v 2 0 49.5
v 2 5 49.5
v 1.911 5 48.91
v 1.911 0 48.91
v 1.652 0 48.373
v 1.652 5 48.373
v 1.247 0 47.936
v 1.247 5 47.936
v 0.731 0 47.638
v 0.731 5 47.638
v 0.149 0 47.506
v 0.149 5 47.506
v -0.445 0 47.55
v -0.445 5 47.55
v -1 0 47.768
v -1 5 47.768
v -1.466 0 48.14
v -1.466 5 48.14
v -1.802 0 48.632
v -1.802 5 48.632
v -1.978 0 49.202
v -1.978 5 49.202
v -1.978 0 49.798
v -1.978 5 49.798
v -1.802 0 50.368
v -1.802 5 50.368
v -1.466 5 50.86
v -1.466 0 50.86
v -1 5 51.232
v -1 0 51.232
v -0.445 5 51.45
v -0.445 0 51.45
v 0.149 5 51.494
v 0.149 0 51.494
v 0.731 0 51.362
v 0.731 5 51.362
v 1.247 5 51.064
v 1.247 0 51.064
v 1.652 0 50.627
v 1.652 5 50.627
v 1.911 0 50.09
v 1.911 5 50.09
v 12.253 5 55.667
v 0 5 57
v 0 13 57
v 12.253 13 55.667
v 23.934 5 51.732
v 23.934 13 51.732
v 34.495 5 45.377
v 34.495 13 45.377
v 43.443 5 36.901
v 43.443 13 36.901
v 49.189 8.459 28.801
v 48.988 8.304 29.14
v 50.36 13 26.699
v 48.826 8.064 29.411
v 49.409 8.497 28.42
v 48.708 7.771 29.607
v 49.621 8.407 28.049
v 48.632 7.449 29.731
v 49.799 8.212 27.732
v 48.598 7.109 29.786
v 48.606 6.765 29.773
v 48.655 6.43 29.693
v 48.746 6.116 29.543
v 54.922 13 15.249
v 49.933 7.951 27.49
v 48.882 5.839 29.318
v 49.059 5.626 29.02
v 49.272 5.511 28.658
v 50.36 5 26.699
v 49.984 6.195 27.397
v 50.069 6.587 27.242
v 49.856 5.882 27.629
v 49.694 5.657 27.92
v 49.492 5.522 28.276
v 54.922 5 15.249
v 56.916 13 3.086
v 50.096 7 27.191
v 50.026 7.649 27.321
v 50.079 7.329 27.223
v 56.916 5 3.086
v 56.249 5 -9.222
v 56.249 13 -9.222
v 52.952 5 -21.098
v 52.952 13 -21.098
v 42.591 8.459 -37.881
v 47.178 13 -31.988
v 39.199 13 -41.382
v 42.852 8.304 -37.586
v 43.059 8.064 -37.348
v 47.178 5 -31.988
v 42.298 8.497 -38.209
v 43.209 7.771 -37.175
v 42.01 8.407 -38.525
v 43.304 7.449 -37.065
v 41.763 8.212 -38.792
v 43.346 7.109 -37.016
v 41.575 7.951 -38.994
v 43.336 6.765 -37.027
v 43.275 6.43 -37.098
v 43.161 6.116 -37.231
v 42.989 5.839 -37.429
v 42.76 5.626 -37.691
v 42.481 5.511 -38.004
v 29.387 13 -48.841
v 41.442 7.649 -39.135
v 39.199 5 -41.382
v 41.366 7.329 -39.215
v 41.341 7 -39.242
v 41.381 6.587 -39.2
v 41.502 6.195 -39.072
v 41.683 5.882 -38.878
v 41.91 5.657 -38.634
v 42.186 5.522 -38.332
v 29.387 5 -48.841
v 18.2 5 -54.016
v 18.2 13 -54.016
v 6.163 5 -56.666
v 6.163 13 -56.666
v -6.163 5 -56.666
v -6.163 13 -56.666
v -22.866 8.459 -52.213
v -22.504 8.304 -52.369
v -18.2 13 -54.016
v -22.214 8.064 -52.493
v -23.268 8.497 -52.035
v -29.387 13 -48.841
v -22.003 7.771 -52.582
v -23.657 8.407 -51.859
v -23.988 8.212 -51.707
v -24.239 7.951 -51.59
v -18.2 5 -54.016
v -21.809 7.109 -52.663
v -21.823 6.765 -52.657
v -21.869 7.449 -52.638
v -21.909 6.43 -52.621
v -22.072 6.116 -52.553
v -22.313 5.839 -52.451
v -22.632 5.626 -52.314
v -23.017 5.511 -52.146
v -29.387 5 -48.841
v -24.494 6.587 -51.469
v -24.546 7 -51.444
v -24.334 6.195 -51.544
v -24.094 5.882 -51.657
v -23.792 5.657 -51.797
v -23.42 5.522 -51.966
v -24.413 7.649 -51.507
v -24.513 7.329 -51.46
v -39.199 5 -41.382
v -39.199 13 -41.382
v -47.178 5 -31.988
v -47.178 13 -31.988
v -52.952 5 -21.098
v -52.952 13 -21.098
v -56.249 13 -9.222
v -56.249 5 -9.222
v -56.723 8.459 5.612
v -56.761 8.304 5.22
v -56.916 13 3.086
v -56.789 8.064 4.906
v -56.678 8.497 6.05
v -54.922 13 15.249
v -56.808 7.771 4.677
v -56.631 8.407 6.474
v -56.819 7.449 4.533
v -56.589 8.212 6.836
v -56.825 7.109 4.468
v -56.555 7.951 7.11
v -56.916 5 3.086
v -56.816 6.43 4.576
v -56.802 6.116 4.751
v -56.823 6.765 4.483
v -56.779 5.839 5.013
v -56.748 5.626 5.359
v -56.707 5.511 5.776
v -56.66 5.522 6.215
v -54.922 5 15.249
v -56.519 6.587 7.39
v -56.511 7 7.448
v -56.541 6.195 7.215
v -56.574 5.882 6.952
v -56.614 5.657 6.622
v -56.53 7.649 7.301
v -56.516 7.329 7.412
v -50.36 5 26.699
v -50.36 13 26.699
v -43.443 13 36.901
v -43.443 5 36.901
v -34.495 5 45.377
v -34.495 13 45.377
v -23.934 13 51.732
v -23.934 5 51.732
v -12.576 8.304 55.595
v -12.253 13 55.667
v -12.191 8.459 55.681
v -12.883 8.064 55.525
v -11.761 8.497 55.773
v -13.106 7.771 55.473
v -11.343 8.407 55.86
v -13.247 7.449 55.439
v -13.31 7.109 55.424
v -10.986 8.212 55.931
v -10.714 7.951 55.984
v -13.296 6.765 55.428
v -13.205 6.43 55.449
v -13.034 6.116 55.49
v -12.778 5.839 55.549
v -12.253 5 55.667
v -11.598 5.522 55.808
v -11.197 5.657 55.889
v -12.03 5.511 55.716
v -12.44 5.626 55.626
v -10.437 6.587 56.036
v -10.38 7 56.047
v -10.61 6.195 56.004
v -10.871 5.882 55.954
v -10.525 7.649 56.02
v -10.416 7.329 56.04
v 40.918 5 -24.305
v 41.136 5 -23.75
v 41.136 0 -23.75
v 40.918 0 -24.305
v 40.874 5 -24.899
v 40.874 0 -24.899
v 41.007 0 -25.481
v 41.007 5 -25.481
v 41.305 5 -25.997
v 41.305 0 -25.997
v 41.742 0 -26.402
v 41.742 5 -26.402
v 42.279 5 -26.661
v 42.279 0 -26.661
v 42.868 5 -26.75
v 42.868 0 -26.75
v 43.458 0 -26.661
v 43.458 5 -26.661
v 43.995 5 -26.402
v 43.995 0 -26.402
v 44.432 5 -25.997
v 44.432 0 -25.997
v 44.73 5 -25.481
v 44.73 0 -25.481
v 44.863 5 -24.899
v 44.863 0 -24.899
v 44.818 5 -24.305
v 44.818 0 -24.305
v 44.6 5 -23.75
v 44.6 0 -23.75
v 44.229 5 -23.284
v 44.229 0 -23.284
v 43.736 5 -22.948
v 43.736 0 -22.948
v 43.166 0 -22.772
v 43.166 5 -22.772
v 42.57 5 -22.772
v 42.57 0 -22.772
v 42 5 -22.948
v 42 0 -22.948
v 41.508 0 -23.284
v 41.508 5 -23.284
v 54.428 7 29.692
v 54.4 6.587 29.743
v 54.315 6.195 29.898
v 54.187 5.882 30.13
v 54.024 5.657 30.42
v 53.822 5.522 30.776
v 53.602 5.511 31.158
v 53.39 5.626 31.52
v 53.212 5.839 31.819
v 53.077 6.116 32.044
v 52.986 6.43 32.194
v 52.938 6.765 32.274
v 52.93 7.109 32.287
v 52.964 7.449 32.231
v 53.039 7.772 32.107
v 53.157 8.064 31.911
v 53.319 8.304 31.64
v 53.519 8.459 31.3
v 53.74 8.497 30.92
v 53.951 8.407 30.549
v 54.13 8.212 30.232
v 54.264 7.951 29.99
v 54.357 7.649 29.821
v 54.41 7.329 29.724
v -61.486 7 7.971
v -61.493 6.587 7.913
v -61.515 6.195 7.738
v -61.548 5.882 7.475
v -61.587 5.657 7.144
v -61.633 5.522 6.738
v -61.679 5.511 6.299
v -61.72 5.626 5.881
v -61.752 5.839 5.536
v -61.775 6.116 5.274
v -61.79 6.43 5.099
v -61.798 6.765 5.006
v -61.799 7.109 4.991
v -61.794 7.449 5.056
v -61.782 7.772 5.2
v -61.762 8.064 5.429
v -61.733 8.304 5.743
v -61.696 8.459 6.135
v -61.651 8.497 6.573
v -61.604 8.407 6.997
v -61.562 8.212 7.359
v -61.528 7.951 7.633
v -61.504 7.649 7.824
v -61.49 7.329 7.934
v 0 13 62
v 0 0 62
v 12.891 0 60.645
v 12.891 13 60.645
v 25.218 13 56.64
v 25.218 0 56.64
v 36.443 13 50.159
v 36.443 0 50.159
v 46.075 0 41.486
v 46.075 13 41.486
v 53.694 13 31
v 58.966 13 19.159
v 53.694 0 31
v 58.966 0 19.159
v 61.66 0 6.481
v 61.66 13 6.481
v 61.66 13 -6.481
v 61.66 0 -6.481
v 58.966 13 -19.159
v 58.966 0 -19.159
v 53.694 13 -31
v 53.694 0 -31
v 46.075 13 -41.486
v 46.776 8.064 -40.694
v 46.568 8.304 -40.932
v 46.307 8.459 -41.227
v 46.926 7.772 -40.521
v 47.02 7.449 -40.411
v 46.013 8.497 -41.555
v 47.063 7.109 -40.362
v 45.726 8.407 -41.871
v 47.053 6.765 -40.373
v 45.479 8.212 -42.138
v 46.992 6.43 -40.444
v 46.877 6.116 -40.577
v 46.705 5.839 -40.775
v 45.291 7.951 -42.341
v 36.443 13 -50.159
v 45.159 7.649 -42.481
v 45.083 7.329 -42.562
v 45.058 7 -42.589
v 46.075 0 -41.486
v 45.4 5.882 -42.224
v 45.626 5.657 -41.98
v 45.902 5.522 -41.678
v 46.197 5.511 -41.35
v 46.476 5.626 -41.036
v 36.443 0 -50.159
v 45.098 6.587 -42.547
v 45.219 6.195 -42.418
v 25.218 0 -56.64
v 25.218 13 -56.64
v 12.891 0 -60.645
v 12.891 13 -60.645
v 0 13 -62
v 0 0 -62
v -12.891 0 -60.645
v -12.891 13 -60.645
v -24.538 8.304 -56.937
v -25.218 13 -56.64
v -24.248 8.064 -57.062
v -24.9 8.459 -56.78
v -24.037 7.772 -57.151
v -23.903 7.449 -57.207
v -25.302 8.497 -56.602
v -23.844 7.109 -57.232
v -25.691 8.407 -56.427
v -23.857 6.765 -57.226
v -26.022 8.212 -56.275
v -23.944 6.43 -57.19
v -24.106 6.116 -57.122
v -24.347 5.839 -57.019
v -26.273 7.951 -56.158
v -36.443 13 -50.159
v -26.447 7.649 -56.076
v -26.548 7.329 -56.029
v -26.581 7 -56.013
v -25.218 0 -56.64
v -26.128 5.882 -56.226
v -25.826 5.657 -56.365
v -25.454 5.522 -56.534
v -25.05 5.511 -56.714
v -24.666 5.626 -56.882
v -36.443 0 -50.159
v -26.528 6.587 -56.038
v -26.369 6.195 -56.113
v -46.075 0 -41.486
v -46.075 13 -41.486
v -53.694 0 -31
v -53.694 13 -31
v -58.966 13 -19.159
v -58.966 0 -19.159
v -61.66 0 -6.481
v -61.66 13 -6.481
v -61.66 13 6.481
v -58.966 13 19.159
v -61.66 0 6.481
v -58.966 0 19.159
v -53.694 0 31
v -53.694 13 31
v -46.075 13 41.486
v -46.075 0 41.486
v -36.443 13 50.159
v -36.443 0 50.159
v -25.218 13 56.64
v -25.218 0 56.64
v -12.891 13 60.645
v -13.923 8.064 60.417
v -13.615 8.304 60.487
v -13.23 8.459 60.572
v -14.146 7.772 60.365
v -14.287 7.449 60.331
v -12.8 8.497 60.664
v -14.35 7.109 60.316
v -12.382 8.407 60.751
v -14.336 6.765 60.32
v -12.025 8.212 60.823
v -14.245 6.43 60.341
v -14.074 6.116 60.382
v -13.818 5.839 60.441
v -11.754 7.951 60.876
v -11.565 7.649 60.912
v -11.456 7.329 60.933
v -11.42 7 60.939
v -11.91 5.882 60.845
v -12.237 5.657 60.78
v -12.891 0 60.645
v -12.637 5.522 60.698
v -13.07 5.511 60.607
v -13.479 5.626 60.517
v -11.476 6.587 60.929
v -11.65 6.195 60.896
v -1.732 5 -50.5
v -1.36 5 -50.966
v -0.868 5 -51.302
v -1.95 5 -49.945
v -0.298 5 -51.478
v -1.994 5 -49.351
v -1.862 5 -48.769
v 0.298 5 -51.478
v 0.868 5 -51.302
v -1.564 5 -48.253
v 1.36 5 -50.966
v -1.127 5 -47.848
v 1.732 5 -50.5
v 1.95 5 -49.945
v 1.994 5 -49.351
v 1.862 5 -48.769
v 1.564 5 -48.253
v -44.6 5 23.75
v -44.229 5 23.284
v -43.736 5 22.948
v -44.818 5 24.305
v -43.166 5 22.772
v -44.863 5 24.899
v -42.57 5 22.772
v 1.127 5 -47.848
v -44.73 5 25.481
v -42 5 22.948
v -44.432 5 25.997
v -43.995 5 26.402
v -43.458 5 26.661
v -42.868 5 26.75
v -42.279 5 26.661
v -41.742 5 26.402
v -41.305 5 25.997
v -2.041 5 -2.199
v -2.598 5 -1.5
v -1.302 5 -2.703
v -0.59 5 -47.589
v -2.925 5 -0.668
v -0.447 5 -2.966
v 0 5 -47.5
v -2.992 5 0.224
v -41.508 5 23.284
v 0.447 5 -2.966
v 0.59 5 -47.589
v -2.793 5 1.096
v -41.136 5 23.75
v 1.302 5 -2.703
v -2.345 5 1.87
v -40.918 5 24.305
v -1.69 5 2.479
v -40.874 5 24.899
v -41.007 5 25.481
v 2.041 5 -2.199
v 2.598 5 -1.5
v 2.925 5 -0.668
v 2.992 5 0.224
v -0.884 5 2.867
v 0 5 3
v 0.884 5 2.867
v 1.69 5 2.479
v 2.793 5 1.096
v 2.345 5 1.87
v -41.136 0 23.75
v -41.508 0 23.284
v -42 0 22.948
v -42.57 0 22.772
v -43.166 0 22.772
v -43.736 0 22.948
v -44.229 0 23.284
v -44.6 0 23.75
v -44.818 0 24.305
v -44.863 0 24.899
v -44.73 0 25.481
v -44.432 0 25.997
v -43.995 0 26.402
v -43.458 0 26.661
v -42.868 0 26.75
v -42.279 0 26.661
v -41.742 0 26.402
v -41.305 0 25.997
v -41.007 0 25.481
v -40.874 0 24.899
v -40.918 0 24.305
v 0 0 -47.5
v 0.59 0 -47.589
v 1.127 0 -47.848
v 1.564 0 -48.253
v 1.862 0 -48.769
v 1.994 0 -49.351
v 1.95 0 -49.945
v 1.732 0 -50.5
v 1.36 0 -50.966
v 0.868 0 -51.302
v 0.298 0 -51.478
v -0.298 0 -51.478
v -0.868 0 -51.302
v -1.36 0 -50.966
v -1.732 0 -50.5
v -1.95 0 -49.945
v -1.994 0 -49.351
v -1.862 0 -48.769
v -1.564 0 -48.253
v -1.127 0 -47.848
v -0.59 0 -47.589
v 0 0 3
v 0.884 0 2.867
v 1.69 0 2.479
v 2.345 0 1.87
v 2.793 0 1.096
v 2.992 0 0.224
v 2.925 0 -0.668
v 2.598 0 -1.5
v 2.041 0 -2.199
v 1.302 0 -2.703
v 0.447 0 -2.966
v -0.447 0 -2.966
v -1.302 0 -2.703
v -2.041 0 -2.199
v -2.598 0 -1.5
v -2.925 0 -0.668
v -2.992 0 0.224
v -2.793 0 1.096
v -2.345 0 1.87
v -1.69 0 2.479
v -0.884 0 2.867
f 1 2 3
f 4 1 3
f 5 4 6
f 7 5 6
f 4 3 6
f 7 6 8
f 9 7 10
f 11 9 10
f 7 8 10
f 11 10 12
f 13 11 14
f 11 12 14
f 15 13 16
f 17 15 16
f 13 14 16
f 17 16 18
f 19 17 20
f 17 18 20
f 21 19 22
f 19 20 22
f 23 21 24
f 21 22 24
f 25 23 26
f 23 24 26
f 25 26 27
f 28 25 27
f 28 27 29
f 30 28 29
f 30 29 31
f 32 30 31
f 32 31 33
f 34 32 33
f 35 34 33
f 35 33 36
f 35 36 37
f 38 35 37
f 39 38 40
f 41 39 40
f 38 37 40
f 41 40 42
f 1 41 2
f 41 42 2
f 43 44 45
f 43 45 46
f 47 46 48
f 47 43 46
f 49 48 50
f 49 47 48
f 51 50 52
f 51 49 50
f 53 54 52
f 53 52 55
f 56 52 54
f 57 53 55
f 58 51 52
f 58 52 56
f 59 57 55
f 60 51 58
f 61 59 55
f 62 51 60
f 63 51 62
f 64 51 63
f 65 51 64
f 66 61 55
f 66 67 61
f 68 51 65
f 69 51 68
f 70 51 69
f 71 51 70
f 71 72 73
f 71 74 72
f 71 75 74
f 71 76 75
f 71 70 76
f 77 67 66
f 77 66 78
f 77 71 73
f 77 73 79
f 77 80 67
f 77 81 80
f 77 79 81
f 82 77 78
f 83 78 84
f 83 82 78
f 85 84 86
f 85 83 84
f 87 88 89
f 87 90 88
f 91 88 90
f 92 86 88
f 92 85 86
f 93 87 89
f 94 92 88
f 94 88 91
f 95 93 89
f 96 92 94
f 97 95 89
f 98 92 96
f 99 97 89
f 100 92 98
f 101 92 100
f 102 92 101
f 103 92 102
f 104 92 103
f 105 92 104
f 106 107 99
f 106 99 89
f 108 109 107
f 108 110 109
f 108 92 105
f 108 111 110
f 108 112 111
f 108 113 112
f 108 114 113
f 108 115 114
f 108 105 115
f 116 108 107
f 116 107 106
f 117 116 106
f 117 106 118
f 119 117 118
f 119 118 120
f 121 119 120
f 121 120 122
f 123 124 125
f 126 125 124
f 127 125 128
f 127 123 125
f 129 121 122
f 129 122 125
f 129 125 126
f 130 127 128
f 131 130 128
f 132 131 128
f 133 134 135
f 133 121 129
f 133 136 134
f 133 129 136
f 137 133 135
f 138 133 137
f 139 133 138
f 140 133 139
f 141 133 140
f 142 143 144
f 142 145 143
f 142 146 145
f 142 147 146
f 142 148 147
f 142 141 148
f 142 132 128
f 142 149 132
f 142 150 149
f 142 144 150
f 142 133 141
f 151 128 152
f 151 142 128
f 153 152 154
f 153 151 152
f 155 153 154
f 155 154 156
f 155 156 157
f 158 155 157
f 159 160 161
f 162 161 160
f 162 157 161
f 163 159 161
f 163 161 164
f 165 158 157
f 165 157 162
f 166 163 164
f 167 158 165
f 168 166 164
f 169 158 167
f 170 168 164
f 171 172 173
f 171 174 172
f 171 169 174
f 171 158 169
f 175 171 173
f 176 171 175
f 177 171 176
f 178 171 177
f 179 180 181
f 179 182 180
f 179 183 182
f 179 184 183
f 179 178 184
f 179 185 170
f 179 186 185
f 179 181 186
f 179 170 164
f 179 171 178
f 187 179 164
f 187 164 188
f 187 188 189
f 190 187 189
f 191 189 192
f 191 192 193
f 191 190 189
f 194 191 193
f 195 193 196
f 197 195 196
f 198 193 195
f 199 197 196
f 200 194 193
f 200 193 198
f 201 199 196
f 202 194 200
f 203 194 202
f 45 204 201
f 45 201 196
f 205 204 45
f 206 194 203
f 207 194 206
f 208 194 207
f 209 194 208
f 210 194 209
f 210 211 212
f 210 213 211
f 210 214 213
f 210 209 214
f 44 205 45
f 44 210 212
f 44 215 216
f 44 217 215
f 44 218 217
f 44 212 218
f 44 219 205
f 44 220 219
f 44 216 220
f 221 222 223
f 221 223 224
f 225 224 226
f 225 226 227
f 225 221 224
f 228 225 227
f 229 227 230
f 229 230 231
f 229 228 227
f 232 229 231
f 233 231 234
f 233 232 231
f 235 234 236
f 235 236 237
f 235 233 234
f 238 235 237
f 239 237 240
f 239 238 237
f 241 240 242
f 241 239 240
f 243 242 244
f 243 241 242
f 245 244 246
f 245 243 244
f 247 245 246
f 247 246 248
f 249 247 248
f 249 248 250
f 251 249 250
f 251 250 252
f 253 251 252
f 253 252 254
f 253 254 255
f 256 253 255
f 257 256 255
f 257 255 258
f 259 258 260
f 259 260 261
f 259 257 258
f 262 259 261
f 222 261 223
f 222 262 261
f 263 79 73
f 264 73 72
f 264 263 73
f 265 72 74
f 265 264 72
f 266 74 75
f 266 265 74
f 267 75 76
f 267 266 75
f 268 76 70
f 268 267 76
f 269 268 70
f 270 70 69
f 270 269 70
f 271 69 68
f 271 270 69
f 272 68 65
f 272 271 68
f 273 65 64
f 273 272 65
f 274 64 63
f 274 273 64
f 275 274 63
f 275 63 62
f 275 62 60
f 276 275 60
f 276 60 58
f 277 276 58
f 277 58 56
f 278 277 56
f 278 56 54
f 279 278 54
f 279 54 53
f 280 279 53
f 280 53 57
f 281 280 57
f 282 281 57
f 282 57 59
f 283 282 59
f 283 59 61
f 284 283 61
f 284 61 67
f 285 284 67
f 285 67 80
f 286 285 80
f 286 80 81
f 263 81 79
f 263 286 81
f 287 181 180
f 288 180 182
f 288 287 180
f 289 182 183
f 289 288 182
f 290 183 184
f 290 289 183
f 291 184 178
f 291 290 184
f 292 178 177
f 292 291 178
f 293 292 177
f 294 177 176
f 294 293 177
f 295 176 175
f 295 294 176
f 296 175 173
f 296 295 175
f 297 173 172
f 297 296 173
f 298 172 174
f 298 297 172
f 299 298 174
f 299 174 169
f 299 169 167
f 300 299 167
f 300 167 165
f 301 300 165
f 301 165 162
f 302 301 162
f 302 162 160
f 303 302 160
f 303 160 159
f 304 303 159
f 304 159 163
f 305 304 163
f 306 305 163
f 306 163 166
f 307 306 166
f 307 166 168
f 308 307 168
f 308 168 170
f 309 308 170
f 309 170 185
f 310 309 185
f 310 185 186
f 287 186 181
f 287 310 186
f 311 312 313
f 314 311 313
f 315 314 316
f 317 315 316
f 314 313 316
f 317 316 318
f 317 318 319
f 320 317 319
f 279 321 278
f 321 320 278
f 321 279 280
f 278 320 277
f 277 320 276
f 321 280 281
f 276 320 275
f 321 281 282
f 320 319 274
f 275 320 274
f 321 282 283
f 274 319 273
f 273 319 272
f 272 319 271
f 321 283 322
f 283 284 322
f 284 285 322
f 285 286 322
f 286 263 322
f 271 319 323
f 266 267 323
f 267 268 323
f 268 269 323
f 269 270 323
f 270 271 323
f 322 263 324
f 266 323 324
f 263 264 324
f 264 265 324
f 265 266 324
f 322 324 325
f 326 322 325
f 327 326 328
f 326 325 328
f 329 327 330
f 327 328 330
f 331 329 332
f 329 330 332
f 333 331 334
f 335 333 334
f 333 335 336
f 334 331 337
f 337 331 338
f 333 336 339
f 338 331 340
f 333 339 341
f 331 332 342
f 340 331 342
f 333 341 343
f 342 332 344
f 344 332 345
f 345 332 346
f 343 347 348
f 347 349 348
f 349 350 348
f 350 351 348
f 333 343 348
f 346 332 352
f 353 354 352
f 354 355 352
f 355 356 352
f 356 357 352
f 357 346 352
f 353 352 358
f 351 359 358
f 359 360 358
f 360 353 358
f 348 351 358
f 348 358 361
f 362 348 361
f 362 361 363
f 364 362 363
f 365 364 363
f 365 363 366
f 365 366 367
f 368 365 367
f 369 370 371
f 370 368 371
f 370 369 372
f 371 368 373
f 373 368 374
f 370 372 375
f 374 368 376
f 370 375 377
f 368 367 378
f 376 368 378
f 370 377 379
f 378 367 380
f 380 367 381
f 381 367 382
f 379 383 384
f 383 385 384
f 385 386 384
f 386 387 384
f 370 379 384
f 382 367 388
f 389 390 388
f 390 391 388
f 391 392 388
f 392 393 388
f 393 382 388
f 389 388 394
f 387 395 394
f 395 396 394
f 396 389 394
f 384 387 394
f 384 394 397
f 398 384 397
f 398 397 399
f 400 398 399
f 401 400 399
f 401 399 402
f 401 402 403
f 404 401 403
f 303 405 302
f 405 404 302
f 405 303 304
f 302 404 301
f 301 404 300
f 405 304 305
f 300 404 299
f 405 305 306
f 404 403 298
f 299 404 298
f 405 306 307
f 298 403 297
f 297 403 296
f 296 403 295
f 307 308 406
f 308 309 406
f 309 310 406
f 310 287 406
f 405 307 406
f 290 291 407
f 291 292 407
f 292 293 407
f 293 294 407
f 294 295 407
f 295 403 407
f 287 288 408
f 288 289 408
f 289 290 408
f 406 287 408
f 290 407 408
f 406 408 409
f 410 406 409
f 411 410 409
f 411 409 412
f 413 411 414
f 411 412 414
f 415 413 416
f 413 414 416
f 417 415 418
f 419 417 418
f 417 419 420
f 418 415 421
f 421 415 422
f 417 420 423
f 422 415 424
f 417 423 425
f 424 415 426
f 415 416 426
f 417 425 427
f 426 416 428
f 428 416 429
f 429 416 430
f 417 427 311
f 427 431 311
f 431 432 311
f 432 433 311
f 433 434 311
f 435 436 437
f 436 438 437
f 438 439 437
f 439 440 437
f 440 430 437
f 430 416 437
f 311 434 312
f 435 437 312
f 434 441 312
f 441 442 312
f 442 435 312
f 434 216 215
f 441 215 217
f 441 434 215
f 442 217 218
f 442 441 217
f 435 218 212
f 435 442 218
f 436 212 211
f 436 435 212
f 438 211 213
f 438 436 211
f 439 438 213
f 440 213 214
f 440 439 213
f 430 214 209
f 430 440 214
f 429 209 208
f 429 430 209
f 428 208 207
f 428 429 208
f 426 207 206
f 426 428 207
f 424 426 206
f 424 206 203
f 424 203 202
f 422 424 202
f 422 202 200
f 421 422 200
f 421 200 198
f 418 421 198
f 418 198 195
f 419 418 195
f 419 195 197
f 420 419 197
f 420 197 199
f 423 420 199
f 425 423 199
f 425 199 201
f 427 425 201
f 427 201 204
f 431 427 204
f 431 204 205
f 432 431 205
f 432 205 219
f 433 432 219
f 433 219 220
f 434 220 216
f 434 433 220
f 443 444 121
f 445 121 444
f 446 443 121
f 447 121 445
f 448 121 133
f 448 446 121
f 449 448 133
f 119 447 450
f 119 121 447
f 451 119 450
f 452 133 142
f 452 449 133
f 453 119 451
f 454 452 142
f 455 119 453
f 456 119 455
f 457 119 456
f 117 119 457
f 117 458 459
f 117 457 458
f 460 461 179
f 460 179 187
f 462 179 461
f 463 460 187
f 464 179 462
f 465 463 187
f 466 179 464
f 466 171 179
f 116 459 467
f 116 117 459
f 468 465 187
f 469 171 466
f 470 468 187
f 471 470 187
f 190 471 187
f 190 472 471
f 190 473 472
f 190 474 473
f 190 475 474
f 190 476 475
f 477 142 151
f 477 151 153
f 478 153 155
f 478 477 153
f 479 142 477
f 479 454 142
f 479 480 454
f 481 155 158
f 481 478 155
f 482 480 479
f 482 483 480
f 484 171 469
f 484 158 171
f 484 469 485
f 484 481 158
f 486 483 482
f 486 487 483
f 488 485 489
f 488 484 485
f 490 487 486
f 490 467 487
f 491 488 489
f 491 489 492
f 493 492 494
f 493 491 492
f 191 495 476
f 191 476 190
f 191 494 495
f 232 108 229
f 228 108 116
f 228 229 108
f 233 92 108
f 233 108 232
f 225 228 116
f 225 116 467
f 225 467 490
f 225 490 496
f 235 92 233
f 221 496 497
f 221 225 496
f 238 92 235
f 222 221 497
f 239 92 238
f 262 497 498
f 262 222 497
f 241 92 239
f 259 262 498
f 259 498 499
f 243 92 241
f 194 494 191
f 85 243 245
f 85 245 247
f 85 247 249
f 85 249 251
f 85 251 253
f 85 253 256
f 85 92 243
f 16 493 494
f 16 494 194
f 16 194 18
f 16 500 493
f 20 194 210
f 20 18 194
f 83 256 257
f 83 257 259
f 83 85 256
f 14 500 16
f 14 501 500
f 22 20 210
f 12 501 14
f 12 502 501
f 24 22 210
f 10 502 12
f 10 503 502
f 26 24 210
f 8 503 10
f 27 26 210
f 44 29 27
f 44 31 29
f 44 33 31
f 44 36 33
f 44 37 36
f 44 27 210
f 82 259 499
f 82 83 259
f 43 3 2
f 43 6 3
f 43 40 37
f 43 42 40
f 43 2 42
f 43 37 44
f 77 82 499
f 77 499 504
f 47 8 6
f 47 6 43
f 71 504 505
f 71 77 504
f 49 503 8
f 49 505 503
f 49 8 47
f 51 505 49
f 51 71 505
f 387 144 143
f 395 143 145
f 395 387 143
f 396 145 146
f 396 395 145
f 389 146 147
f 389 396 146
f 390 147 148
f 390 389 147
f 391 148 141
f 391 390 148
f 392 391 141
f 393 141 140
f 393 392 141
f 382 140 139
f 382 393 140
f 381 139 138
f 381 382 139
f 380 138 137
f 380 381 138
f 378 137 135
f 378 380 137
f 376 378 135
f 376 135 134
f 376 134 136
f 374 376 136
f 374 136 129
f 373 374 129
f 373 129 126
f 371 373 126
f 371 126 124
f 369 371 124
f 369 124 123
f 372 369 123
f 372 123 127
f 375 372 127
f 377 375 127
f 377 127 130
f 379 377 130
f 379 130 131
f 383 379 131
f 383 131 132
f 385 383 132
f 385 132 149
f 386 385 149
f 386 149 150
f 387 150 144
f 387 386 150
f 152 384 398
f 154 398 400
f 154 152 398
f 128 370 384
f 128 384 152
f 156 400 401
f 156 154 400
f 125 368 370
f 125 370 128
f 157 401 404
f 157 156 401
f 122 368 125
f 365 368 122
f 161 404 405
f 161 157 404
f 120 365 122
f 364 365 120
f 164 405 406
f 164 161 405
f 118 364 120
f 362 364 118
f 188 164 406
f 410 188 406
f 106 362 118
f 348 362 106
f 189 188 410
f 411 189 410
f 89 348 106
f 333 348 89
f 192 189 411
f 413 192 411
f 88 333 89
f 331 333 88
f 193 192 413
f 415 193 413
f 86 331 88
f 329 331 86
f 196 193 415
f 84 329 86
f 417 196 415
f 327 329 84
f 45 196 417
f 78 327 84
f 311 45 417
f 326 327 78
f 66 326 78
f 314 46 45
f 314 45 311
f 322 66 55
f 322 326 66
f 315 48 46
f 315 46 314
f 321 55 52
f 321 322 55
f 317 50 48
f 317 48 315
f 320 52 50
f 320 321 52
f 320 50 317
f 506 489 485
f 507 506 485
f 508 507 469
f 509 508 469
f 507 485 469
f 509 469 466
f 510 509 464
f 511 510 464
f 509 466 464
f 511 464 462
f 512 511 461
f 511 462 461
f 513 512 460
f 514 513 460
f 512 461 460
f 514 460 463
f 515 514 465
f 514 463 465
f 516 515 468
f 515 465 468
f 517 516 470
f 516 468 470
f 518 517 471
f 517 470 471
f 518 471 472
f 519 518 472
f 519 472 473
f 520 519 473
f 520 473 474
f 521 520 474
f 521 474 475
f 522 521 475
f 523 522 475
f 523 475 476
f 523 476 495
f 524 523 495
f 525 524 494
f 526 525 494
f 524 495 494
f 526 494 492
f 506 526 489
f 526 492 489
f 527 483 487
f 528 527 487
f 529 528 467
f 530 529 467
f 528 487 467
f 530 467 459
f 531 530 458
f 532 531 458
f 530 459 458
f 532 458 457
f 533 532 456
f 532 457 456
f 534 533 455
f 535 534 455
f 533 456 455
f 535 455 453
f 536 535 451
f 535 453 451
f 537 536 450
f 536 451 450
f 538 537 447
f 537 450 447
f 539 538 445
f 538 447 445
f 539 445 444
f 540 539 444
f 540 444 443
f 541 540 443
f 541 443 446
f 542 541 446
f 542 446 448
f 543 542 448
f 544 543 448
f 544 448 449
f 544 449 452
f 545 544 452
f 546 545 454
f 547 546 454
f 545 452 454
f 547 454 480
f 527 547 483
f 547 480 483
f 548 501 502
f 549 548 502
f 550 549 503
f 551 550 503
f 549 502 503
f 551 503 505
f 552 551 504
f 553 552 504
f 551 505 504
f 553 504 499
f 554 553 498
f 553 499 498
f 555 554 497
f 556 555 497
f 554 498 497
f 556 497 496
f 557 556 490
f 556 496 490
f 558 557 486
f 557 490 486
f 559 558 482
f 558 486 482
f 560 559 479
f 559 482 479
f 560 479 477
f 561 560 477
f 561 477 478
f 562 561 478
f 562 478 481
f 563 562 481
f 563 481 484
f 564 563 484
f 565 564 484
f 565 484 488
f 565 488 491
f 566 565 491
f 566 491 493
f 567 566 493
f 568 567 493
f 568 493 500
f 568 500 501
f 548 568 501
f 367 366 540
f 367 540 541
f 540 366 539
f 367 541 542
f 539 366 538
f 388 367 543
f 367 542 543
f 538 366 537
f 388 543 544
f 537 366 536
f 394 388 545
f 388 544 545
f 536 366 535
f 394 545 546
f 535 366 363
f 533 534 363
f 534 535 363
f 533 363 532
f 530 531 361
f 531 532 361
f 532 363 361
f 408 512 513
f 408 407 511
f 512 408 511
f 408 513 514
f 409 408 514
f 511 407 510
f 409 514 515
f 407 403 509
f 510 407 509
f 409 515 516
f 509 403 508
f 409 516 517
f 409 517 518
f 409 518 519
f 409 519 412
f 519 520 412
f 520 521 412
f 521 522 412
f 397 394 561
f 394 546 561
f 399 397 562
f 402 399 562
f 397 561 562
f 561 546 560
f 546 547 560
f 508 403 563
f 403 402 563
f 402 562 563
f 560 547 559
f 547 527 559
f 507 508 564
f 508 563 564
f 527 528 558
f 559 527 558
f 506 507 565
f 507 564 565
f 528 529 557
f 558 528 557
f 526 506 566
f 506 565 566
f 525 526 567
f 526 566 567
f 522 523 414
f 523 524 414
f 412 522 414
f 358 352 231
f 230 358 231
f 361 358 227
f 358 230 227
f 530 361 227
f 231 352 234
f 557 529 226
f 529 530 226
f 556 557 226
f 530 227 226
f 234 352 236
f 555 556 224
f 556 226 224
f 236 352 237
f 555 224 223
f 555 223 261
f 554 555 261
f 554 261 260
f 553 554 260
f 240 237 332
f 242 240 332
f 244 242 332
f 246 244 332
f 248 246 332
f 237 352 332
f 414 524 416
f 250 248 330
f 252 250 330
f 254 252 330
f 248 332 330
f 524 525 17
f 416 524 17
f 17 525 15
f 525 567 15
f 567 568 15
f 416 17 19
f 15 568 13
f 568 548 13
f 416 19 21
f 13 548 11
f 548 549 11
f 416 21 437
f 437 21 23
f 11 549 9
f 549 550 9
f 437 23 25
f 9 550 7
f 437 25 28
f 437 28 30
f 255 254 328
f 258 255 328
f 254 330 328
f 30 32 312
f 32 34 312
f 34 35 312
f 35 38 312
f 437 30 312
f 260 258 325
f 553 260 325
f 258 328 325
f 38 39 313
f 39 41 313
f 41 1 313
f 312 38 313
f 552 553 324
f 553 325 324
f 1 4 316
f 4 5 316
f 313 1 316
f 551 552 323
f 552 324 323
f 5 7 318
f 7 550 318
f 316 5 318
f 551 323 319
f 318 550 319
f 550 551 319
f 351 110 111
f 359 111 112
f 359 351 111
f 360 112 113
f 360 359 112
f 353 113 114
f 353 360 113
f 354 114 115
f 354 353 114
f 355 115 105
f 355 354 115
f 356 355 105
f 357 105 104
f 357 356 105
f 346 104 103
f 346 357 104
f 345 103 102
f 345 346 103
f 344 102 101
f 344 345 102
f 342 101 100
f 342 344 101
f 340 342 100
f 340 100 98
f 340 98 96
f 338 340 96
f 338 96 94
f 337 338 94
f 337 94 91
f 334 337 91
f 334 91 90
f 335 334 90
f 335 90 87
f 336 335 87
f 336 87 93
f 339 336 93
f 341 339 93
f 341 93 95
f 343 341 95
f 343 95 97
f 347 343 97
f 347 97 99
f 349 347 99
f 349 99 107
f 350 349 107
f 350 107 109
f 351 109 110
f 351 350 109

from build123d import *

# Parameters (mm, degrees)
SKETCH1_R               = 62
BOSS_EXTRUDE1_DEPTH     = 5
SKETCH2_R               = 2
CUT_EXTRUDE1_DEPTH      = 5
CIRPATTERN1_COUNT       = 2
CIRPATTERN1_ANGLE       = 120
MIRROR1_COPY_1_SKETCH_R = 2
MIRROR1_COPY_1_DEPTH    = 5
SKETCH5_R               = 62
SKETCH5_R_2             = 57
BOSS_EXTRUDE2_DEPTH     = 8
CUT_EXTRUDE2_START      = -90
SKETCH6_R               = 1.5
CUT_EXTRUDE2_DEPTH      = 91
CIRPATTERN2_COUNT       = 5
SKETCH7_R               = 3
CUT_EXTRUDE3_DEPTH      = 10


with BuildPart() as part:
    # Sketch1 → Boss-Extrude1 (new body)
    with BuildSketch(Plane(origin=(0, 0, 0), x_dir=(1, 0, 0), z_dir=(0, 1, 0))):
        with Locations(Location((0, 0, 0), (0, 0, 270))):
            Circle(SKETCH1_R)
    extrude(amount=BOSS_EXTRUDE1_DEPTH)

    # Sketch2 → Cut-Extrude1 (cut)
    with BuildSketch(Plane(origin=(0, 5, 0), x_dir=(1, 0, 0), z_dir=(0, 1, 0))):
        with Locations(Location((0, 49.5, 0), (0, 0, 270))):
            Circle(SKETCH2_R)
    cut_extrude1 = extrude(amount=-CUT_EXTRUDE1_DEPTH, mode=Mode.SUBTRACT)

    # CirPattern1: Cut-Extrude1 ×2 about axis
    cirpattern1_axis = Axis((0, 5, 0), (0, 1, 0))
    for i in range(1, CIRPATTERN1_COUNT):
        add(cut_extrude1.rotate(cirpattern1_axis, i * CIRPATTERN1_ANGLE / (CIRPATTERN1_COUNT - 1)), mode=Mode.SUBTRACT)

    # Mirror1: Cut-Extrude1 across plane
    add(cut_extrude1.mirror(Plane(origin=(0, 0, 0), x_dir=(-0.49999999999999806, 0, 0.8660254037844398), z_dir=(-0.8660254037844398, 0, -0.49999999999999806))), mode=Mode.SUBTRACT)

    # Mirror1 copy 1 sketch → Mirror1 copy 1 (cut)
    with BuildSketch(Plane(origin=(0, 5, 0), x_dir=(1, 0, 0), z_dir=(0, 1, 0))):
        with Locations((0, -49.5)):
            Circle(MIRROR1_COPY_1_SKETCH_R)
    extrude(amount=-MIRROR1_COPY_1_DEPTH, mode=Mode.SUBTRACT)

    # Sketch5 → Boss-Extrude2 (add)
    with BuildSketch(Plane(origin=(0, 5, 0), x_dir=(1, 0, 0), z_dir=(0, 1, 0))):
        with Locations(Location((0, 0, 0), (0, 0, 270))):
            Circle(SKETCH5_R)
        with Locations(Location((0, 0, 0), (0, 0, 270))):
            Circle(SKETCH5_R_2, mode=Mode.SUBTRACT)
    extrude(amount=BOSS_EXTRUDE2_DEPTH)

    # Sketch6 → Cut-Extrude2 (cut)
    with BuildSketch(Plane(origin=(0, 0, 0), x_dir=(-0.49999999999999806, 0, 0.8660254037844398), z_dir=(-0.8660254037844398, 0, -0.49999999999999806)).offset(CUT_EXTRUDE2_START)):
        with Locations(Location((0, 7, 0), (0, 0, 180))):
            Circle(SKETCH6_R)
    cut_extrude2 = extrude(amount=CUT_EXTRUDE2_DEPTH, mode=Mode.SUBTRACT)

    # CirPattern2: Cut-Extrude2 ×5 about axis
    cirpattern2_axis = Axis((0, 13, 0), (0, 1, 0))
    for i in range(1, CIRPATTERN2_COUNT):
        add(cut_extrude2.rotate(cirpattern2_axis, i * 360 / CIRPATTERN2_COUNT), mode=Mode.SUBTRACT)

    # Sketch7 → Cut-Extrude3 (cut)
    with BuildSketch(Plane(origin=(0, 5, 0), x_dir=(1, 0, 0), z_dir=(0, 1, 0))):
        with Locations(Location((0, 0, 0), (0, 0, 270))):
            Circle(SKETCH7_R)
    extrude(amount=-CUT_EXTRUDE3_DEPTH, mode=Mode.SUBTRACT)


solid = part.part
